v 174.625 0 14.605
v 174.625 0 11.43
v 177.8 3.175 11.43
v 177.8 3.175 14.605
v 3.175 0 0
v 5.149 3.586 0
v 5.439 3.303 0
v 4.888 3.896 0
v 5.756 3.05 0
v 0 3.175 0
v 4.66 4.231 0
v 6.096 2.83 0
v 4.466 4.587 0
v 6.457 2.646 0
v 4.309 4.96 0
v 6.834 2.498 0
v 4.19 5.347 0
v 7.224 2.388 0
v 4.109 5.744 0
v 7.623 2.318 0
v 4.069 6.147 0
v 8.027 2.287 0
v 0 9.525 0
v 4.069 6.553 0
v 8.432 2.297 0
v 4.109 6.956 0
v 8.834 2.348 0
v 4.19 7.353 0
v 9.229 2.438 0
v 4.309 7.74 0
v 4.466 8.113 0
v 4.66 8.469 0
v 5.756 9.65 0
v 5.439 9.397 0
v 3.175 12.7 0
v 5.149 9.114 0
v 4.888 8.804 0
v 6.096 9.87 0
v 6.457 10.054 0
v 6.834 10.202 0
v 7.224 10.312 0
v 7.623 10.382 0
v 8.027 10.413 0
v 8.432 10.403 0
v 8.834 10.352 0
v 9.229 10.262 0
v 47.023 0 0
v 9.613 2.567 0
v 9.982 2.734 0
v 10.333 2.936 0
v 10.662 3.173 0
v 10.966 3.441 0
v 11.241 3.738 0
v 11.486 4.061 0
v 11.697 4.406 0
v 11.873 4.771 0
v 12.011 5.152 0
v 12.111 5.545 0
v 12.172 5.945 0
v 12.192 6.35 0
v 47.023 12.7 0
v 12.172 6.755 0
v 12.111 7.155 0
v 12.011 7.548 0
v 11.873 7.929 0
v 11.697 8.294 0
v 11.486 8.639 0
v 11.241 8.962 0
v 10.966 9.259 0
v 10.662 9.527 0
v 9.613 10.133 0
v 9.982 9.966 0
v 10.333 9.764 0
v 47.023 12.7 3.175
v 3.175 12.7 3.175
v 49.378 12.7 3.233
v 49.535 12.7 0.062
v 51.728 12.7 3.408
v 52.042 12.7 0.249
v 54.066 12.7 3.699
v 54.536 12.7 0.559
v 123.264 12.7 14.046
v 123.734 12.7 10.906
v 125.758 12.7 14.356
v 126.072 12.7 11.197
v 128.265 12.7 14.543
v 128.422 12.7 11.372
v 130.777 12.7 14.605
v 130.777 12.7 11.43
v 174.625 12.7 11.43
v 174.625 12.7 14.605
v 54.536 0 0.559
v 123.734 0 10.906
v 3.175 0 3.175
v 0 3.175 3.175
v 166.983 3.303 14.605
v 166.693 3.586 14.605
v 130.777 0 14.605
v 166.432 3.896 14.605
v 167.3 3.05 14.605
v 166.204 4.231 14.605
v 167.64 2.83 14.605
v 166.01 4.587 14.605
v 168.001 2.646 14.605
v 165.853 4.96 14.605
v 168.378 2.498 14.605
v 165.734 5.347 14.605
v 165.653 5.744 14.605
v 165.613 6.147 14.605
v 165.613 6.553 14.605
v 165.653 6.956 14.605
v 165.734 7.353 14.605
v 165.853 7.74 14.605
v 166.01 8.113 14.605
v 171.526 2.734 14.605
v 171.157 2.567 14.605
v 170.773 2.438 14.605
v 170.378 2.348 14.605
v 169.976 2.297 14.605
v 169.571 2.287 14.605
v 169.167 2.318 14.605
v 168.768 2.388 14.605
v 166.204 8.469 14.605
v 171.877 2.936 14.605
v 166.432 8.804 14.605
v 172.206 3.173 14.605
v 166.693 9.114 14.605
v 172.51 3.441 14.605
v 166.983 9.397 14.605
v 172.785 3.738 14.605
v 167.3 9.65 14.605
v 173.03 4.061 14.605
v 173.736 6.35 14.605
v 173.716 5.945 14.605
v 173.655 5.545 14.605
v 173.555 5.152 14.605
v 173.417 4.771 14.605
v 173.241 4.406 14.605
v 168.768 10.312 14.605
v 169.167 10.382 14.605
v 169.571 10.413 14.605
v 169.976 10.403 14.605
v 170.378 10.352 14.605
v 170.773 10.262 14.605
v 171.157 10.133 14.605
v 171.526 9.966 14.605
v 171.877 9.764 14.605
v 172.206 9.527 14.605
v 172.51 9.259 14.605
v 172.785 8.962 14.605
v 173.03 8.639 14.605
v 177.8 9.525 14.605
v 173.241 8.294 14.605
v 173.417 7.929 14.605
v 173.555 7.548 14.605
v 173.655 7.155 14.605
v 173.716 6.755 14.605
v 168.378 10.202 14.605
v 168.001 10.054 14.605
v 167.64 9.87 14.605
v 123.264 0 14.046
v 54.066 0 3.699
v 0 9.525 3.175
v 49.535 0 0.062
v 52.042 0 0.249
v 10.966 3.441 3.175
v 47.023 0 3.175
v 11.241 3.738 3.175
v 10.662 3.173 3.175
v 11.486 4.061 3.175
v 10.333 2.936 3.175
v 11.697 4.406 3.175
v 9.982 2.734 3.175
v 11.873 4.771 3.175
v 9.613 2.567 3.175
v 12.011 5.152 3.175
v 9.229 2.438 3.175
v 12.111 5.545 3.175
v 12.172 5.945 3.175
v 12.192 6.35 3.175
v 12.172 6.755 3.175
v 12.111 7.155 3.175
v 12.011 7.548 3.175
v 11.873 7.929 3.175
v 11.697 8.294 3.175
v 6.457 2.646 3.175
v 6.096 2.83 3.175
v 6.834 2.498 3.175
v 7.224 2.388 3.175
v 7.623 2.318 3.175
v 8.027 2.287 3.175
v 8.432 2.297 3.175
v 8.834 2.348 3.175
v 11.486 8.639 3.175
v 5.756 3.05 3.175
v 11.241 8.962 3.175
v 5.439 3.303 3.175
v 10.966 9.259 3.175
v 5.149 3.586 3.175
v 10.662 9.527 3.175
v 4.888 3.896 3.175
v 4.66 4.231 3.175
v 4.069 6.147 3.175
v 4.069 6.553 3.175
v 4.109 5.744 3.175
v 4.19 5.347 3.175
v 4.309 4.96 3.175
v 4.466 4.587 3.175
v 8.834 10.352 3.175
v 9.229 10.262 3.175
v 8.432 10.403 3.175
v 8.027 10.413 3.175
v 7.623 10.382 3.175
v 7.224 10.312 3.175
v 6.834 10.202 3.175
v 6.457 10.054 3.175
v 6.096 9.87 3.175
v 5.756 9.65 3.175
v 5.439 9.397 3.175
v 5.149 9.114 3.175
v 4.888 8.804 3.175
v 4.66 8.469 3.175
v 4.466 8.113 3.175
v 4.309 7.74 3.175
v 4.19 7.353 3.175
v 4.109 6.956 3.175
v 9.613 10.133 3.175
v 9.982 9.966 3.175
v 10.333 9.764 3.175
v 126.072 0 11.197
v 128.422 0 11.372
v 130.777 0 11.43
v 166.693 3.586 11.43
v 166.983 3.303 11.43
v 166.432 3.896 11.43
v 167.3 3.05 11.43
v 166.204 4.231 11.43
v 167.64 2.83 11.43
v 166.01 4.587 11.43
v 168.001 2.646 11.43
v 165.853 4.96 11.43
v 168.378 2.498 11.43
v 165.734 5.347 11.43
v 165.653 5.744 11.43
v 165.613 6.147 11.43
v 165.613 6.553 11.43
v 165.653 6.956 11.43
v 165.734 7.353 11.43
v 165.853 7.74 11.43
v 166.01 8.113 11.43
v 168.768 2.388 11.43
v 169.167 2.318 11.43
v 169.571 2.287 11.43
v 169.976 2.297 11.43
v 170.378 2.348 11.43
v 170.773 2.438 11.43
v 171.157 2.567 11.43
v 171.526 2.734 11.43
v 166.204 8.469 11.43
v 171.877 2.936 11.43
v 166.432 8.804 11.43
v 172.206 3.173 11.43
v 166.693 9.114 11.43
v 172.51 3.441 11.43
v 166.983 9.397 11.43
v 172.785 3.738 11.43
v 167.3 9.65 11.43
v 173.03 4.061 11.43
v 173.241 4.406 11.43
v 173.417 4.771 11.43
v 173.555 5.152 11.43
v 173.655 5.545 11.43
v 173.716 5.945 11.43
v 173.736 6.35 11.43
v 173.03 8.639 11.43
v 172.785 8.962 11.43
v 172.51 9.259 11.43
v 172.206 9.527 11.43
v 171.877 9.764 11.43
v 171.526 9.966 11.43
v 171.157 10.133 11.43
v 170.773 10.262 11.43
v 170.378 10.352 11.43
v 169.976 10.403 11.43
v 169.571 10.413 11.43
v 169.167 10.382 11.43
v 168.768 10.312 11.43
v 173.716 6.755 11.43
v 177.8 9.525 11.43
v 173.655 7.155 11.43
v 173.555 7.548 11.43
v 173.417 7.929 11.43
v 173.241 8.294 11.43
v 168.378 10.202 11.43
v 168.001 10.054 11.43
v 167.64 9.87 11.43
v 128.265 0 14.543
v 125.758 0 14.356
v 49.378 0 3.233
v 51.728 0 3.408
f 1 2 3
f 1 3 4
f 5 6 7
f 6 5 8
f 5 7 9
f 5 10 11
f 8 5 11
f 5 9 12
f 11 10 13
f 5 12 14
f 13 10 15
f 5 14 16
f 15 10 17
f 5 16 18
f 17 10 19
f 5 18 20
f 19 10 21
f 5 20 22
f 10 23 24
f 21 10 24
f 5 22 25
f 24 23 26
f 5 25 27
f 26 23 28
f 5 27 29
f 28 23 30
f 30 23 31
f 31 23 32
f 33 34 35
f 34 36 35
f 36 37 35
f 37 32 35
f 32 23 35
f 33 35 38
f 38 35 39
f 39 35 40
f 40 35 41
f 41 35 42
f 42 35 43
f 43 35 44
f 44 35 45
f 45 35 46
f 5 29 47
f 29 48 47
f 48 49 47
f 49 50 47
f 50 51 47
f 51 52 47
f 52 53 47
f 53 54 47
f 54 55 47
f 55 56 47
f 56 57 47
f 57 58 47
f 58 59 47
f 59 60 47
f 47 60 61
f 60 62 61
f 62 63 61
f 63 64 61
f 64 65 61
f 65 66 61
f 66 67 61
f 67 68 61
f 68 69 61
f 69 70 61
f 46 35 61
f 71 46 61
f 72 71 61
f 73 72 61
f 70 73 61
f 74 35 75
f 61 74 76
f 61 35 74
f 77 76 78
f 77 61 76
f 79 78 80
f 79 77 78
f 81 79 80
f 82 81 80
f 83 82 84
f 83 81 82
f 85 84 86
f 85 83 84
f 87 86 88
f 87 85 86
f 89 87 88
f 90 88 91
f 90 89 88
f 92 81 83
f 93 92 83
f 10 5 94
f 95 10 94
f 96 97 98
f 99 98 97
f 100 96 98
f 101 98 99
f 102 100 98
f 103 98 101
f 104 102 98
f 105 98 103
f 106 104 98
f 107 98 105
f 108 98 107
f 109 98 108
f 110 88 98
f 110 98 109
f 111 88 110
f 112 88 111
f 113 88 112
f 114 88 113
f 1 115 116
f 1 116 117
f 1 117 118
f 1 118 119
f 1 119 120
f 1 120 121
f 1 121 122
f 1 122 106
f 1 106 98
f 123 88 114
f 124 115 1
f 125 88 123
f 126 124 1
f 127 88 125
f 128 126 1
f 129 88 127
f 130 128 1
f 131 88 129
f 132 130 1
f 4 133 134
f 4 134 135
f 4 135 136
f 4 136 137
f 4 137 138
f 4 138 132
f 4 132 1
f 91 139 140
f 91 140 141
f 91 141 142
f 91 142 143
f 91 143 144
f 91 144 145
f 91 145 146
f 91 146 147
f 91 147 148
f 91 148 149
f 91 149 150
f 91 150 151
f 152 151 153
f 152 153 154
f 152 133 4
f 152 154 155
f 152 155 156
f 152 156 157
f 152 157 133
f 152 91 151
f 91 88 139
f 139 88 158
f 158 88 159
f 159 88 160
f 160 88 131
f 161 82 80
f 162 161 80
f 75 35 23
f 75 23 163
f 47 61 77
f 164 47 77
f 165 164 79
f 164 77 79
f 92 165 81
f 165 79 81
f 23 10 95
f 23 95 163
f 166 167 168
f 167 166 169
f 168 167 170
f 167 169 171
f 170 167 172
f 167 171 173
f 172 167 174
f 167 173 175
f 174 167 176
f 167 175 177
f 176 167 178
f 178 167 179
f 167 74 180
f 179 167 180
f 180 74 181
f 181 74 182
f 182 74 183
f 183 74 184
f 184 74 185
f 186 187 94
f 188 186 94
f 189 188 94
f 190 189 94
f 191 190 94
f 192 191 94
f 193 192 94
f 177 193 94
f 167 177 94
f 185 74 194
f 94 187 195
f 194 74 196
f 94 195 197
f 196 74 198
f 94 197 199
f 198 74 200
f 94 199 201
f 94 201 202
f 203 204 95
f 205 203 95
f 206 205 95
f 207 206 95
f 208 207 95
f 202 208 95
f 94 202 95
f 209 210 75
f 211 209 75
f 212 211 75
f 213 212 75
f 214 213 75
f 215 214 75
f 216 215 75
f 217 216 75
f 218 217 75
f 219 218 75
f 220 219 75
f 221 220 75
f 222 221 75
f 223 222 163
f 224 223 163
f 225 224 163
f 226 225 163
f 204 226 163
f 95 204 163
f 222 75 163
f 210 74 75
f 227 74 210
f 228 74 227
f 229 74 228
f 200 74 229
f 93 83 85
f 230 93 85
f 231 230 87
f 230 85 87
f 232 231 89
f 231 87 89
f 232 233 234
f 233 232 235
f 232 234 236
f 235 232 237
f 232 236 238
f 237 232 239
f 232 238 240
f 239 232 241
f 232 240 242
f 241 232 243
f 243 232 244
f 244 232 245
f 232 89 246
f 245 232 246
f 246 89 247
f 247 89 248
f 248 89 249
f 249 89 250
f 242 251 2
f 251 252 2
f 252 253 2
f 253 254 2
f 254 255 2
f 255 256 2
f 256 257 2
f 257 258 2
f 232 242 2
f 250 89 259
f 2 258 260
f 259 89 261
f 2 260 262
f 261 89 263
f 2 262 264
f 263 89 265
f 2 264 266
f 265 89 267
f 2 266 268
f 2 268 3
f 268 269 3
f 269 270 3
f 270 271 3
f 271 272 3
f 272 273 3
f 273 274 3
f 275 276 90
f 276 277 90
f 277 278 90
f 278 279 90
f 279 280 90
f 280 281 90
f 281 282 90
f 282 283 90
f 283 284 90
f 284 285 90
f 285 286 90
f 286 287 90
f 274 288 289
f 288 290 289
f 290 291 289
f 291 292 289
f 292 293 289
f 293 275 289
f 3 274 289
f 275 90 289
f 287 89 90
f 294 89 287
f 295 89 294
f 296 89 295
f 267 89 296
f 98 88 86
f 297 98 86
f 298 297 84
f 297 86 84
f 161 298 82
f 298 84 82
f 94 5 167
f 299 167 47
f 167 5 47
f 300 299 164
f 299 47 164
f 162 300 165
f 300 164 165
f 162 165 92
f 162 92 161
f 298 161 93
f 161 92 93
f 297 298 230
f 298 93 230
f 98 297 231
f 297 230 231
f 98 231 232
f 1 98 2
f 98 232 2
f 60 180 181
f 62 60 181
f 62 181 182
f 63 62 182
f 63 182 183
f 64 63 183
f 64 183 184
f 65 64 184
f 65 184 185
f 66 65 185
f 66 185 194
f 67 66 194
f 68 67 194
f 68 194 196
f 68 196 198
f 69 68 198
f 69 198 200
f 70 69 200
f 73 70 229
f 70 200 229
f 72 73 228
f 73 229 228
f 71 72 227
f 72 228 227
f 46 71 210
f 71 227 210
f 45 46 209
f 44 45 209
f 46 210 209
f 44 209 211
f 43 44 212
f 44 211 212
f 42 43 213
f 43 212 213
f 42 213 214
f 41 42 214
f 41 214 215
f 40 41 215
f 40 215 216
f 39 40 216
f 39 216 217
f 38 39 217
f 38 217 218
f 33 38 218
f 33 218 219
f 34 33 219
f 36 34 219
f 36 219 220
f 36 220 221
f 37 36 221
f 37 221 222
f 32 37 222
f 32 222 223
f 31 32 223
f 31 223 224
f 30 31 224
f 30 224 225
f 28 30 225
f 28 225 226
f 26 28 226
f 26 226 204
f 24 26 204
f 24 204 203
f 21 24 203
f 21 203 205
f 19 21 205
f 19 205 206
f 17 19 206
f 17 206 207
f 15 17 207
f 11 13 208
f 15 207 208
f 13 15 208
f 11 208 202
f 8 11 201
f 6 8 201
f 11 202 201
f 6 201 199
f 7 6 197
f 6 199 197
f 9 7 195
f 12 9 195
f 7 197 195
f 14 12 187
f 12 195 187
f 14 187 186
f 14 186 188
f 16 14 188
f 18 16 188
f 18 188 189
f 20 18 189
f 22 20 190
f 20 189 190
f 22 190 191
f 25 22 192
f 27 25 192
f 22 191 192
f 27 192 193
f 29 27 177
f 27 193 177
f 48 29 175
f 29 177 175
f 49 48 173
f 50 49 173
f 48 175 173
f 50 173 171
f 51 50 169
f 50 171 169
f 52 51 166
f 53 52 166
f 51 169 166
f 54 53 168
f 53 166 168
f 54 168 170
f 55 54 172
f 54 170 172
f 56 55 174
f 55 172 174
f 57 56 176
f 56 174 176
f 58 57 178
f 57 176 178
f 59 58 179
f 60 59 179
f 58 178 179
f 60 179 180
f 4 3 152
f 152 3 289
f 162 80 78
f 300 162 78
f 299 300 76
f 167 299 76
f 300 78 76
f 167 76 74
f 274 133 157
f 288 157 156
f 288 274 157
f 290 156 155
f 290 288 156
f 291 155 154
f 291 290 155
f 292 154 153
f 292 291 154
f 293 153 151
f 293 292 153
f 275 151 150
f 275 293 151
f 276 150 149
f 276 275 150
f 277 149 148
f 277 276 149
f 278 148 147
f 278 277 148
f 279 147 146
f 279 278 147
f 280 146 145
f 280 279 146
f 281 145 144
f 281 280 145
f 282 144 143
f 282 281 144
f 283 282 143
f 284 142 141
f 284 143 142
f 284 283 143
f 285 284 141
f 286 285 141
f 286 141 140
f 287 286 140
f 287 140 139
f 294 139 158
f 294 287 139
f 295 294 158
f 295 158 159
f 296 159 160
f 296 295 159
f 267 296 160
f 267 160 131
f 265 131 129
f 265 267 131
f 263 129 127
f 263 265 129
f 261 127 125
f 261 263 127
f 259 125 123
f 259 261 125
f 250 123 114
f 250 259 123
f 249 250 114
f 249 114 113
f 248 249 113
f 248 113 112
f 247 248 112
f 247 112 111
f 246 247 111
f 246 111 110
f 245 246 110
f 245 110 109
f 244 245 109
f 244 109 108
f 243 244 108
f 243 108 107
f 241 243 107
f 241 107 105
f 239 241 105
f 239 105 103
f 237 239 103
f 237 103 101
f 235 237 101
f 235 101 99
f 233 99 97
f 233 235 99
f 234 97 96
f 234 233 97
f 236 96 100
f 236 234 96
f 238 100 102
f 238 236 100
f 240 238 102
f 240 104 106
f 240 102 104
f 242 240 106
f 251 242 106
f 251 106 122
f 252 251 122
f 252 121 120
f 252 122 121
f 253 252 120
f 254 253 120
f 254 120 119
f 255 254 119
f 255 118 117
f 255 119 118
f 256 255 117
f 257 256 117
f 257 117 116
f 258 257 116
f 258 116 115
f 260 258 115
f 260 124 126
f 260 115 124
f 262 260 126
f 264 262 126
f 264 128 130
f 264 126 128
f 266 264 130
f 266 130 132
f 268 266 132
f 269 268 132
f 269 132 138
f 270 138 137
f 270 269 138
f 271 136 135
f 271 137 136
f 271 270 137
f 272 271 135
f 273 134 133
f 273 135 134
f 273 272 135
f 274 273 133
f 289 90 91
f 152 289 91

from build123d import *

# Parameters (mm, degrees)
SKETCH1_W          = 177.8
SKETCH1_H          = 12.7
BASE_EXTRUDE_DEPTH = 14.605
EXTRUDE1_DEPTH     = 50.8
SKETCH2_R          = 4.064
CUT_EXTRUDE1_DEPTH = 4.175
SKETCH3_R          = 4.064
CUT_EXTRUDE2_DEPTH = 4.175
CHAMFER1_SIZE      = 3.175
CHAMFER2_SIZE      = 3.175


with BuildPart() as part:
    # Sketch1 → Base-Extrude (new body)
    with BuildSketch(Plane.XY):
        with Locations((88.9, 6.35)):
            Rectangle(SKETCH1_W, SKETCH1_H)
    extrude(amount=BASE_EXTRUDE_DEPTH)


with BuildPart() as body_2:
    # Sketch5 → Extrude1 (new body)
    with BuildSketch(Plane(origin=(0, 12.7, 0), x_dir=(-1, 0, 0), z_dir=(0, 1, 0))):
        with BuildLine():
            Line((0, 0), (-47.022766551, 0))
            ThreePointArc((-47.022766551, 0), (-50.789601569, 0.139848461), (-54.535696978, 0.55862386))
            Line((-54.535696978, 0.55862386), (-123.733861174, 10.906290131))
            ThreePointArc((-123.733861174, 10.906290131), (-127.245825619, 11.298892068), (-130.777233449, 11.43))
            Line((-130.777233449, 11.43), (-177.8, 11.43))
            Line((-177.8, 11.43), (-177.8, 14.605))
            Line((-177.8, 14.605), (-130.777233449, 14.605))
            ThreePointArc((-130.777233449, 14.605), (-127.010398431, 14.465151539), (-123.264303022, 14.04637614))
            Line((-123.264303022, 14.04637614), (-54.066138826, 3.698709869))
            ThreePointArc((-54.066138826, 3.698709869), (-50.554174381, 3.306107932), (-47.022766551, 3.175))
            Line((-47.022766551, 3.175), (0, 3.175))
            Line((0, 3.175), (0, 0))
        make_face()
    extrude(amount=-EXTRUDE1_DEPTH)


with BuildPart() as part_1:
    add(part.part)

    # Combine1: intersect body 2
    add(body_2.part, mode=Mode.INTERSECT)

    # Sketch2 → Cut-Extrude1 (cut, through all)
    with BuildSketch(Plane.XY.offset(3.175)):
        with Locations((8.128, 6.35)):
            Circle(SKETCH2_R)
    extrude(amount=-CUT_EXTRUDE1_DEPTH, mode=Mode.SUBTRACT)

    # Sketch3 → Cut-Extrude2 (cut, through all)
    with BuildSketch(Plane(origin=(185.269572221, -0.228654981, 11.43), x_dir=(1, 0, 0), z_dir=(0, 0, 1))):
        with Locations((-15.597572221, 6.578654981)):
            Circle(SKETCH3_R)
    extrude(amount=CUT_EXTRUDE2_DEPTH, mode=Mode.SUBTRACT)

    # Chamfer1
    chamfer1_edges = [part_1.edges().sort_by_distance(p)[0] for p in [
        (177.8, 0, 13.0175),
        (177.8, 12.7, 13.0175),
    ]]
    chamfer(chamfer1_edges, length=CHAMFER1_SIZE)

    # Chamfer2
    chamfer2_edges = [part_1.edges().sort_by_distance(p)[0] for p in [
        (0, 12.7, 1.5875),
        (0, 0, 1.5875),
    ]]
    chamfer(chamfer2_edges, length=CHAMFER2_SIZE)


solid = part_1.part
